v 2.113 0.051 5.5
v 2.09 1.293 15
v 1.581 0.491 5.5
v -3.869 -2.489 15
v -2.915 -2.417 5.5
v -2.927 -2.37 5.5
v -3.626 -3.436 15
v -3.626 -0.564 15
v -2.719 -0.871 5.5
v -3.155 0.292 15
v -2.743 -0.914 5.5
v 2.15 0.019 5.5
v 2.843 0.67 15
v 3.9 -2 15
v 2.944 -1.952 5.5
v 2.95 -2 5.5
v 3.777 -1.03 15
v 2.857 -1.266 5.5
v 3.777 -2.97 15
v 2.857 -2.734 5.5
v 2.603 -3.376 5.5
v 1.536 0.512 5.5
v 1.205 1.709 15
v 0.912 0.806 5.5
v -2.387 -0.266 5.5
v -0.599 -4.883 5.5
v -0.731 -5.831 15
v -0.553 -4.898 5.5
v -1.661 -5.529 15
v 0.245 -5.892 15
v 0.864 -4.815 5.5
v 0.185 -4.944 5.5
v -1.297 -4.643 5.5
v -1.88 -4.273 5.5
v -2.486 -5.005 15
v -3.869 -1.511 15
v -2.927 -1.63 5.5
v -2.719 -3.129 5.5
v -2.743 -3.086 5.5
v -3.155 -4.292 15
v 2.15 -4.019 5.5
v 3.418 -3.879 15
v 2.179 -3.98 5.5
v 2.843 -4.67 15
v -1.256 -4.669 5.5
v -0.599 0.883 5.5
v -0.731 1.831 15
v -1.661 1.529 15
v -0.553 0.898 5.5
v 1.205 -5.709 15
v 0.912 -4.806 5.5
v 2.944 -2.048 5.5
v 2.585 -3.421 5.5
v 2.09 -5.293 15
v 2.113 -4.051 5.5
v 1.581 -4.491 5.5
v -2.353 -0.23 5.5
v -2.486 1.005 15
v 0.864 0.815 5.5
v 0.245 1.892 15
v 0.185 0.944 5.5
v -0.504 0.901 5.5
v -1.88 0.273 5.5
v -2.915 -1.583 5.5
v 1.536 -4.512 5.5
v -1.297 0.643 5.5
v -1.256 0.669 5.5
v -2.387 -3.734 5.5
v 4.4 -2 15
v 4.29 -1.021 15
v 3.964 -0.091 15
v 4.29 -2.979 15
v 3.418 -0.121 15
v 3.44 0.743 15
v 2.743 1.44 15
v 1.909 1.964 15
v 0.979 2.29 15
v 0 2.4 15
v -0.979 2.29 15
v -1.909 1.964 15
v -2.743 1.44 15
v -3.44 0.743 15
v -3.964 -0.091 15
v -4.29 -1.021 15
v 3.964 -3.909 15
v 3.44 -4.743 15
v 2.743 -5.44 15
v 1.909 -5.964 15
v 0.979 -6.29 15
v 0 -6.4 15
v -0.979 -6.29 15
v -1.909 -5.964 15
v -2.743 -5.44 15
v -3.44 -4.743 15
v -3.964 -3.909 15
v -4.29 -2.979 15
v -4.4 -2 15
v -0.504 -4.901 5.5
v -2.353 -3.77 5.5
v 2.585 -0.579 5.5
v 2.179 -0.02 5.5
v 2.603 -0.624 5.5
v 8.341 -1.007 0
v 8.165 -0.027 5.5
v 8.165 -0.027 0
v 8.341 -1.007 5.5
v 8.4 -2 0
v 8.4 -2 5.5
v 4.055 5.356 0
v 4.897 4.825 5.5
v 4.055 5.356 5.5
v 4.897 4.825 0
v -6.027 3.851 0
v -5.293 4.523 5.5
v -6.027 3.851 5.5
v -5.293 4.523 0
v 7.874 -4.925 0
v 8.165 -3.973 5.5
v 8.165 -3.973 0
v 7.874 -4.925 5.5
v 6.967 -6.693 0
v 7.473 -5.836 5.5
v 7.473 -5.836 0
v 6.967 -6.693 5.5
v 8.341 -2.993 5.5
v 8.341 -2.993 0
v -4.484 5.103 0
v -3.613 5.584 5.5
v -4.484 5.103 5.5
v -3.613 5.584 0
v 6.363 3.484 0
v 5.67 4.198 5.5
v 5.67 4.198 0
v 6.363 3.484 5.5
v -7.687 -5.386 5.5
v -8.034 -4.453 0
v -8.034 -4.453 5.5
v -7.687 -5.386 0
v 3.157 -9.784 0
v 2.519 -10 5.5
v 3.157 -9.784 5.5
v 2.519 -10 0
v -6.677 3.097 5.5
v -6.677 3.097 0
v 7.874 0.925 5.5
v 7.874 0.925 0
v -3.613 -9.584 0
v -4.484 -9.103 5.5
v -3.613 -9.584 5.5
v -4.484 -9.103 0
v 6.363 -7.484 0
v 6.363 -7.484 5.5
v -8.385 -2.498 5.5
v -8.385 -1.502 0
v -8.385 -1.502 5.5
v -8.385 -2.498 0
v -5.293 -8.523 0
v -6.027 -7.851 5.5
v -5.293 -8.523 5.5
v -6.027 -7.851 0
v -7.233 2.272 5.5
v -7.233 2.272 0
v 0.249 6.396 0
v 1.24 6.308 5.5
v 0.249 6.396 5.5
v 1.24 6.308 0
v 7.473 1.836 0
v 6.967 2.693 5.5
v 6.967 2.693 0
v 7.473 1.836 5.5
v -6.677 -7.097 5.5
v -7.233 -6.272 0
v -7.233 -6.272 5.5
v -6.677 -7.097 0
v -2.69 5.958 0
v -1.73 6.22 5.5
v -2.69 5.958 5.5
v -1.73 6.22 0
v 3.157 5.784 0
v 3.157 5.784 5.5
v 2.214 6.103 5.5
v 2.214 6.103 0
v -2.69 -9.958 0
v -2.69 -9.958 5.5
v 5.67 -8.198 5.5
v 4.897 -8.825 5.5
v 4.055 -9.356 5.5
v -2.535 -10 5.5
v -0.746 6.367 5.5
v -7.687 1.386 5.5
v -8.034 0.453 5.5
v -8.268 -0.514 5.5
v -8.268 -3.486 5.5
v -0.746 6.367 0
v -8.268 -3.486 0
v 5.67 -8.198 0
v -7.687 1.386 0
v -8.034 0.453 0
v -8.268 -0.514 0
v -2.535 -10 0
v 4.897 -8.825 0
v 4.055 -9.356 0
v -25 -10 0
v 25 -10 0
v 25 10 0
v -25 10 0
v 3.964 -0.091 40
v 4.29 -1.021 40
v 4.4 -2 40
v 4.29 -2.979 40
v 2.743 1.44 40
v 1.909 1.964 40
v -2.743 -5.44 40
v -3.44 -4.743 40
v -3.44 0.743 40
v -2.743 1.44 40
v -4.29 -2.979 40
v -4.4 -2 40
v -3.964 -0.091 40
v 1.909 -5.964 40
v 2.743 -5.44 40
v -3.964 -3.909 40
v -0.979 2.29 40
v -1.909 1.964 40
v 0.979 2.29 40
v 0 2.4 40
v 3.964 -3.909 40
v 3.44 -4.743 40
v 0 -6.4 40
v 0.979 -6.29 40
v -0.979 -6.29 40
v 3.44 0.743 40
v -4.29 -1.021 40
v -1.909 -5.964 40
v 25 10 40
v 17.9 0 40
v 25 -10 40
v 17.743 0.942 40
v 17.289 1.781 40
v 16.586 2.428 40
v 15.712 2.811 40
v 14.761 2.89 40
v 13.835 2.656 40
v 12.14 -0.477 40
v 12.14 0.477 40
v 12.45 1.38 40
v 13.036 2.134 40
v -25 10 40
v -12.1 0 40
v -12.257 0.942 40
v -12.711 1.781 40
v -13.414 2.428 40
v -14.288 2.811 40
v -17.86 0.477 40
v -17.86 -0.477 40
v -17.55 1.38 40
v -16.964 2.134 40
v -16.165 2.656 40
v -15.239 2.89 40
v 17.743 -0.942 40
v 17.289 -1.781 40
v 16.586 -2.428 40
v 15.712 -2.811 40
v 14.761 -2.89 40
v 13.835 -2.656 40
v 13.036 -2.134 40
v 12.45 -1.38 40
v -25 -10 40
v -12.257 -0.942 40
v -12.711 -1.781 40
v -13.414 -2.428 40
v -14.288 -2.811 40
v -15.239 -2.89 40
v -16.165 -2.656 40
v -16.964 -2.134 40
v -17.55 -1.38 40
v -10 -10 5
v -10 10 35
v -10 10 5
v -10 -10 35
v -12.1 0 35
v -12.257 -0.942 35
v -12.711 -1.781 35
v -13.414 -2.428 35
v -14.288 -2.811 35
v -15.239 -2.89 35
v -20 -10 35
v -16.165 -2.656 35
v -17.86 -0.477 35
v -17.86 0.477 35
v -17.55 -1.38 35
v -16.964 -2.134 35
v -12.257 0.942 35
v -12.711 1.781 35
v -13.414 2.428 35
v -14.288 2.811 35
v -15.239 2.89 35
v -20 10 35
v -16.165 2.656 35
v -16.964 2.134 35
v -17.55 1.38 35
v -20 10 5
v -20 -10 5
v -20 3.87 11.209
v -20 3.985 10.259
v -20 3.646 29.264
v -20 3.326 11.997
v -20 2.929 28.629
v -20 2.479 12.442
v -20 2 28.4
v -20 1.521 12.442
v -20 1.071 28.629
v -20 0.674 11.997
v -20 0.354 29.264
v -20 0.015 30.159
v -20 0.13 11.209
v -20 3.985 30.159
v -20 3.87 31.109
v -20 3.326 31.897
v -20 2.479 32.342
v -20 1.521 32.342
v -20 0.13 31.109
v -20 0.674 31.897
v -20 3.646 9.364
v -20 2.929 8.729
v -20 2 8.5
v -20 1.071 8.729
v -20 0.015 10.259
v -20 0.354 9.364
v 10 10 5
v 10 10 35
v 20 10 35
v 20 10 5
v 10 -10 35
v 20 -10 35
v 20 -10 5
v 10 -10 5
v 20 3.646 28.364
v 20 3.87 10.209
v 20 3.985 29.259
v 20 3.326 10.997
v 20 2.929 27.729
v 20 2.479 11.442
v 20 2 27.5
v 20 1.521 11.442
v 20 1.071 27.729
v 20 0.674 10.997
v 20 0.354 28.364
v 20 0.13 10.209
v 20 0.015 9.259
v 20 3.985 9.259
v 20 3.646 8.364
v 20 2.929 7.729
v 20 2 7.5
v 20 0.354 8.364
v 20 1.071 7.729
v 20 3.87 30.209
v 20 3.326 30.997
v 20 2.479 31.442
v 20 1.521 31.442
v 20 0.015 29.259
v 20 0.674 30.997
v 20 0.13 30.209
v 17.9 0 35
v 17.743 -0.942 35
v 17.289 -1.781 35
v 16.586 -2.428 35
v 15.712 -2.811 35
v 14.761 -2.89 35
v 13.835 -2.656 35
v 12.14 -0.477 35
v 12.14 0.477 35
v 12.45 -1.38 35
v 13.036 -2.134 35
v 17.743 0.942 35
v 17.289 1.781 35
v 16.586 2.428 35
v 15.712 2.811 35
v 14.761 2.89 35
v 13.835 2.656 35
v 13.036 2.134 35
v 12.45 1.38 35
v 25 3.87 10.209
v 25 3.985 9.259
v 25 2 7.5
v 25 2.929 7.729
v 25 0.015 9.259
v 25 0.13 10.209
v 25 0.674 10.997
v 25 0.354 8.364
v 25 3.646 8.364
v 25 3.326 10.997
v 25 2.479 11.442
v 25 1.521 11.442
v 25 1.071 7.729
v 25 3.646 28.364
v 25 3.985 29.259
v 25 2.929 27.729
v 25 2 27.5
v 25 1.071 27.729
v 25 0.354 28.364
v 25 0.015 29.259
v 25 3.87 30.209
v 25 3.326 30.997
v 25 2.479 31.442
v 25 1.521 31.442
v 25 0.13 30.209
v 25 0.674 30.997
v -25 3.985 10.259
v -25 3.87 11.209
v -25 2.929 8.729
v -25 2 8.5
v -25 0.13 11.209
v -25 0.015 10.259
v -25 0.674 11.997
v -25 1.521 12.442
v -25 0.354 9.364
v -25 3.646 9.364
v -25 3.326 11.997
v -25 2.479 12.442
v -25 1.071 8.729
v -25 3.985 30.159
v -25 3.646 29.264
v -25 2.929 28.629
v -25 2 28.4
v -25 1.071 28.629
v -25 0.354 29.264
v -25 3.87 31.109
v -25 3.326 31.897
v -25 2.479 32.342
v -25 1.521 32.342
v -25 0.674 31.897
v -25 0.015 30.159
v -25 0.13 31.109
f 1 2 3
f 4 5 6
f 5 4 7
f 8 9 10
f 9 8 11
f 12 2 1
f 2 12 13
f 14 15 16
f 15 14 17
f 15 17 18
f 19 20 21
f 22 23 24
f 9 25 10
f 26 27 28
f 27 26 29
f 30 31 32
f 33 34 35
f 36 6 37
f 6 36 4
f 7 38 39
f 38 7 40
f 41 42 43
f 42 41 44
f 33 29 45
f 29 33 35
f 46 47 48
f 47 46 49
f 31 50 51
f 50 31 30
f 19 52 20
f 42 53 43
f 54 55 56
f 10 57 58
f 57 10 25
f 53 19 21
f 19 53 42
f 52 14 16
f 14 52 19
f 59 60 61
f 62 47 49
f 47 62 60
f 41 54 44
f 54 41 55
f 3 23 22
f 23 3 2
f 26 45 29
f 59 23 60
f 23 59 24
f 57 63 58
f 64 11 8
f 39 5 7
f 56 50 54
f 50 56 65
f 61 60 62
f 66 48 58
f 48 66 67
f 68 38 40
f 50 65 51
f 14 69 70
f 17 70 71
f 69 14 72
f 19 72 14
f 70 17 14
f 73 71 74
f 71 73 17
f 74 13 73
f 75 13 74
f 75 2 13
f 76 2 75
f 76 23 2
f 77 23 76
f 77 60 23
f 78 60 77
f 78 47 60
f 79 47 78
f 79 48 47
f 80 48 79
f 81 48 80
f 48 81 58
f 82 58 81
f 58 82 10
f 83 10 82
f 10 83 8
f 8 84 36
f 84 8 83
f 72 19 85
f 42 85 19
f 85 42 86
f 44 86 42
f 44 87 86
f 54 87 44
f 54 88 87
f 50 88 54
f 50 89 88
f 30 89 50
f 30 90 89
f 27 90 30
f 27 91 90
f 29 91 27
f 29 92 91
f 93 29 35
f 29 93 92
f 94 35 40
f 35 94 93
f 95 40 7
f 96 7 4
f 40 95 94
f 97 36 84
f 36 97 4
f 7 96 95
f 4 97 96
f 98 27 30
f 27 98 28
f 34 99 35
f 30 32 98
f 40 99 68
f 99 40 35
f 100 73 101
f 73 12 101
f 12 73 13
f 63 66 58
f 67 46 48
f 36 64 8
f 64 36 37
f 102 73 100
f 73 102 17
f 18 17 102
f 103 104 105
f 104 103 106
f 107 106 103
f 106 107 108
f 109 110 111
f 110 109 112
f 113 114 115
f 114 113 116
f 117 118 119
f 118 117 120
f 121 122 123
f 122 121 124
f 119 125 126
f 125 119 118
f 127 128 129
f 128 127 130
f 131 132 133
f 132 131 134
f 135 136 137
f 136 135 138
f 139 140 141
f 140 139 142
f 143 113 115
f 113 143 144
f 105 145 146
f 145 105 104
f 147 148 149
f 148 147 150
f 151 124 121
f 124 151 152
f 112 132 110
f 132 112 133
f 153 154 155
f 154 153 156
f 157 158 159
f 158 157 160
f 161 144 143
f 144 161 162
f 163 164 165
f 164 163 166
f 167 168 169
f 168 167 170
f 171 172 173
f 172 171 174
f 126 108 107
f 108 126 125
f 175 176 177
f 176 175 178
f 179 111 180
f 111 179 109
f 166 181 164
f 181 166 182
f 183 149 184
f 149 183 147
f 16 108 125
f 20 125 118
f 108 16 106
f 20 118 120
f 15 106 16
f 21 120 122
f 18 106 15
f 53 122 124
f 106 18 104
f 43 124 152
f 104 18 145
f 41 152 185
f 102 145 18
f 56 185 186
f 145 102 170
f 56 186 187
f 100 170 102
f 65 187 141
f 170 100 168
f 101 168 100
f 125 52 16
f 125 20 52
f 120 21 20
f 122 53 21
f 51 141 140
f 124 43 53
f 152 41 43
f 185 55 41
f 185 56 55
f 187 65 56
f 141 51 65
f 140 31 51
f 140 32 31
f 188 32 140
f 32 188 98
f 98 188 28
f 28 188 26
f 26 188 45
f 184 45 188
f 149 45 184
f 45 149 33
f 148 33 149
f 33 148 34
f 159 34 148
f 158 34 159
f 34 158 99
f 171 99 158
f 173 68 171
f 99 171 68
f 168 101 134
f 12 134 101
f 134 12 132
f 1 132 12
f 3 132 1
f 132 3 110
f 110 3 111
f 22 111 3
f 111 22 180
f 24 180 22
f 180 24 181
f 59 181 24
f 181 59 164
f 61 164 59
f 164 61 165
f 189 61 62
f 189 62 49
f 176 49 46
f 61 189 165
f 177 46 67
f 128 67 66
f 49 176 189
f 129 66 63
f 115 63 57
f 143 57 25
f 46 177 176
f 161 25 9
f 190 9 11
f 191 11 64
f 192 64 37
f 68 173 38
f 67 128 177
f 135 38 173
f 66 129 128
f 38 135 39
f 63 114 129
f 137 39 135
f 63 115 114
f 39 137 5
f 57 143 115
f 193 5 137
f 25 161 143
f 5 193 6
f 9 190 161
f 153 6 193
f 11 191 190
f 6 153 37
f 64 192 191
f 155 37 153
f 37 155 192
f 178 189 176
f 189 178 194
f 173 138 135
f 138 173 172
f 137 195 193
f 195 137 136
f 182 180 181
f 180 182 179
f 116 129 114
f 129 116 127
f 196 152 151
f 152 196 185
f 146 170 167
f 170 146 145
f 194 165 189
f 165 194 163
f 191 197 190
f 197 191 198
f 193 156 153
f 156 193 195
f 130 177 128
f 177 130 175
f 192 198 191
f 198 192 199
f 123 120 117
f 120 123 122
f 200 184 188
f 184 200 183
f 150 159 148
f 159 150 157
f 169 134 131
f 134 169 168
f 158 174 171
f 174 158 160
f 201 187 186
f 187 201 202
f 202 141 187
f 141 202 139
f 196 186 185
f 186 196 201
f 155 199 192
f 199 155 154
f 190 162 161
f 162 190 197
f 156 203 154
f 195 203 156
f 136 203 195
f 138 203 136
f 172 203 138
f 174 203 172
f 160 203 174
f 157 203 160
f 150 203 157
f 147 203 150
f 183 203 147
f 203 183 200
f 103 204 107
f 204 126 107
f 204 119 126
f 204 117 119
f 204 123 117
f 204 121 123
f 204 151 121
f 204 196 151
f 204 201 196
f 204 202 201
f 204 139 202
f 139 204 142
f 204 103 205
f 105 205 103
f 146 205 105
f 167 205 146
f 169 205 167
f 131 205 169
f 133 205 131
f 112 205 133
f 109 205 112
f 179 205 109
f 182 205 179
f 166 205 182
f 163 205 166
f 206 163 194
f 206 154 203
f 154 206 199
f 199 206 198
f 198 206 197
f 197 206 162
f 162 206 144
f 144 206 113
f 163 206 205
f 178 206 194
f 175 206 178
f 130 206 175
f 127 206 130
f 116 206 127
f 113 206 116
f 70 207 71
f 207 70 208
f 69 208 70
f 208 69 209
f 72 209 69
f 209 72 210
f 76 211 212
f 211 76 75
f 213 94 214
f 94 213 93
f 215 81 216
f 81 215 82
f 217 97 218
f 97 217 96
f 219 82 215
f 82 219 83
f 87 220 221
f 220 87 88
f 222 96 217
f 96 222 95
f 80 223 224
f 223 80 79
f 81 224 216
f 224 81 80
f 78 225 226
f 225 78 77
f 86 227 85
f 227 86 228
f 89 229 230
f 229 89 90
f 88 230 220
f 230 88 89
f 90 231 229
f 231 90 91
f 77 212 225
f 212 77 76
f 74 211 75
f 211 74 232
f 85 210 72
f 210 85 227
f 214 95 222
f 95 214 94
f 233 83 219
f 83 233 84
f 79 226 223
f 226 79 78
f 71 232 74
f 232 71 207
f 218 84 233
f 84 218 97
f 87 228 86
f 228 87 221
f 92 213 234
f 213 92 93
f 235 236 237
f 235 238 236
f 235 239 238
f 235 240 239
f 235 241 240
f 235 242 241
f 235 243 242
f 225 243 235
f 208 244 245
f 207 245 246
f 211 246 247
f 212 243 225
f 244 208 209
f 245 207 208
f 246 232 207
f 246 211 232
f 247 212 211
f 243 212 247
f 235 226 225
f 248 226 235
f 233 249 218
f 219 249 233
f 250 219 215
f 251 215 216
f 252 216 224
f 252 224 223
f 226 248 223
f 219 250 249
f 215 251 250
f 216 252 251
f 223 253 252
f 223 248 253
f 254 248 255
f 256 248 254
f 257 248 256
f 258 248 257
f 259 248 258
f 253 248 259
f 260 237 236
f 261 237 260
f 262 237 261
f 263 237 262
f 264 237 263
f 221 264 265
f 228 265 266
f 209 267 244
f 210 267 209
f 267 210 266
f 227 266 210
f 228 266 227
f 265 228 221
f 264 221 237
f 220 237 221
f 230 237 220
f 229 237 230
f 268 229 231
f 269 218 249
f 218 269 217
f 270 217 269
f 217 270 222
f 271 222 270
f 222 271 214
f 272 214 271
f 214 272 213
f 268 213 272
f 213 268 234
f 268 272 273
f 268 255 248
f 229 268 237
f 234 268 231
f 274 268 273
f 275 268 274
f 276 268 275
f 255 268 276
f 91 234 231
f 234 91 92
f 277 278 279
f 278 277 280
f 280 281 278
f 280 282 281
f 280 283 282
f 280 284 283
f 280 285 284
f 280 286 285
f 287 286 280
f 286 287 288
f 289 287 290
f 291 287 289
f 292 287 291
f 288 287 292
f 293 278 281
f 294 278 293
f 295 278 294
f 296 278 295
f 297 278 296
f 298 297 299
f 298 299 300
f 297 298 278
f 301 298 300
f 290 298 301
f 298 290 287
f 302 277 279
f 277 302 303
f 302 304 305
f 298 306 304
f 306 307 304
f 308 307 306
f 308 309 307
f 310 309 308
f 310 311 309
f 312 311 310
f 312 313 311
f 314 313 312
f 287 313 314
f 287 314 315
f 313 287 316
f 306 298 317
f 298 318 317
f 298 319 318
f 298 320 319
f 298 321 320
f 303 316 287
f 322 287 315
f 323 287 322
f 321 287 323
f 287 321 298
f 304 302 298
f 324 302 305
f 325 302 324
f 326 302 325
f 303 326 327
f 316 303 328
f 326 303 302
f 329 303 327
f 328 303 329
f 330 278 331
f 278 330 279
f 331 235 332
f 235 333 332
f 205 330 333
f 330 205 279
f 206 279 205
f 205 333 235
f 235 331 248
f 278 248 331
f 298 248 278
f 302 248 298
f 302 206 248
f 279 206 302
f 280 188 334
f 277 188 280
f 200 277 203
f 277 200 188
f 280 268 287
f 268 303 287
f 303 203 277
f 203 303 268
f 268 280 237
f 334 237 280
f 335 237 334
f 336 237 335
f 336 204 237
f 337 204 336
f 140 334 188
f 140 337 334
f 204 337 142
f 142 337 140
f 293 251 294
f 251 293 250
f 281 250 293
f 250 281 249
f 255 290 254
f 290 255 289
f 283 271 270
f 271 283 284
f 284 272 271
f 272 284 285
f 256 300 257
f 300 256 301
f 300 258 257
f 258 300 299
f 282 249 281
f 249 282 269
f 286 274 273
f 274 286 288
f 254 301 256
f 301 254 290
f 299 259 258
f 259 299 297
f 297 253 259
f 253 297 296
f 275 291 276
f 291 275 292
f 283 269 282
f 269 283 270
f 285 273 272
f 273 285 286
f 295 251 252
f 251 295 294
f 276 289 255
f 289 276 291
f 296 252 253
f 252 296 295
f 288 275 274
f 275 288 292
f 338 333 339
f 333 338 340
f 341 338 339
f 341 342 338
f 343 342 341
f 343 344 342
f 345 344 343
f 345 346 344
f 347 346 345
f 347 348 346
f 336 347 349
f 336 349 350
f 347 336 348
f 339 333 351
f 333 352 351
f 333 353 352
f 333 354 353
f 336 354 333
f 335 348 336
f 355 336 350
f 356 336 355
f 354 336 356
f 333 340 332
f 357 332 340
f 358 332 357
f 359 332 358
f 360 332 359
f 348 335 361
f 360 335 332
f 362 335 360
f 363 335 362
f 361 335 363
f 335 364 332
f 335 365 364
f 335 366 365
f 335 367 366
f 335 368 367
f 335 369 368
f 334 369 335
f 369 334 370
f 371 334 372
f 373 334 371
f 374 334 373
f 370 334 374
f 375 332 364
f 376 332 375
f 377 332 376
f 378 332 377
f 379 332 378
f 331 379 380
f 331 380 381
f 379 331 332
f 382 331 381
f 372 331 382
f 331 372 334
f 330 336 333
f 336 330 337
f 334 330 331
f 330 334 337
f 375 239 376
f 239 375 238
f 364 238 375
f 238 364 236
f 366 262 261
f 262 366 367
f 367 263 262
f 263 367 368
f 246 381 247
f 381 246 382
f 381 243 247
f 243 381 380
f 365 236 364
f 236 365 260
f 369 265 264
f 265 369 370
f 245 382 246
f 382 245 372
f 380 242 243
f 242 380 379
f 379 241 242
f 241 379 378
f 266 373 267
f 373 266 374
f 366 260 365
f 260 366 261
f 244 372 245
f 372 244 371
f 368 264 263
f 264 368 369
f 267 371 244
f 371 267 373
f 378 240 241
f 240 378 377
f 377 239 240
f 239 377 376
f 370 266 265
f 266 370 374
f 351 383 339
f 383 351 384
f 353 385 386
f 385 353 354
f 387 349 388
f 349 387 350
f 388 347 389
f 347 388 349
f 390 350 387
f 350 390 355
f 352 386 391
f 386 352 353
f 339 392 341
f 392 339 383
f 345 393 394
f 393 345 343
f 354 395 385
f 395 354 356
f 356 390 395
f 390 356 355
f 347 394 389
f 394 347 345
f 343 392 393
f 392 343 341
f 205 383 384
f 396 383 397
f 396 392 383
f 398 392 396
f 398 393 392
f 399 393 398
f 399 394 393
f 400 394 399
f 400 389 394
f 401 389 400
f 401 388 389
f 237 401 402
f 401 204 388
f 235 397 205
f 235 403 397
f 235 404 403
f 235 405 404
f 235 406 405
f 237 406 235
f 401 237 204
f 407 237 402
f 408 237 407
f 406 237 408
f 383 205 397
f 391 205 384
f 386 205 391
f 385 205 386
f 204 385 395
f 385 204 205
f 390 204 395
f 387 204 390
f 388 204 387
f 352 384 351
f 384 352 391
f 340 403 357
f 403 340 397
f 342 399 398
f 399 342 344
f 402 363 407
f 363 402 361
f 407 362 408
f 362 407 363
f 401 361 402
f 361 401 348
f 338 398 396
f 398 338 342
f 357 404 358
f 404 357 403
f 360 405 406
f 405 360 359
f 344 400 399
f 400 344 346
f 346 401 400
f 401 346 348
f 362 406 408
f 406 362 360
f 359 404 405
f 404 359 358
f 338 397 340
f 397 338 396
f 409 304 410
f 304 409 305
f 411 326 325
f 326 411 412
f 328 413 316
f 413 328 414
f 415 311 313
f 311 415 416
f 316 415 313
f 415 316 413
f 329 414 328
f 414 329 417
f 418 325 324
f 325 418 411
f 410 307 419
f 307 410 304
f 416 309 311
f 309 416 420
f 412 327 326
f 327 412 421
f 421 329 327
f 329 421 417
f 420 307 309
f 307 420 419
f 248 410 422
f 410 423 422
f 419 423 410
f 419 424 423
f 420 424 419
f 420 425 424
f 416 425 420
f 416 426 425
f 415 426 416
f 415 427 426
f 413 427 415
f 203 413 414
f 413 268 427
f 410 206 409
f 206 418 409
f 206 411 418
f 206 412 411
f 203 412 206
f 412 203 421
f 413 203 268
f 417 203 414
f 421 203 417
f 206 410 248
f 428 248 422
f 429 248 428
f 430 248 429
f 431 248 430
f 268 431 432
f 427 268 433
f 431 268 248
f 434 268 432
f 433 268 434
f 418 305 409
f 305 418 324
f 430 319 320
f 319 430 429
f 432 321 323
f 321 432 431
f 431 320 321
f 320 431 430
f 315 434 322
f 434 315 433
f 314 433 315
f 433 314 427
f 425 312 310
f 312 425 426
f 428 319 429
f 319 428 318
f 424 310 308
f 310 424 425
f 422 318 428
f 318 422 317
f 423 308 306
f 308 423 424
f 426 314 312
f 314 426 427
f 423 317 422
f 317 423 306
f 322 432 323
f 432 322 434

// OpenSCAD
$fa = 1;
$fs = 1;

t = 0.4;

w = 50;
h = 40;
d = 20;

difference() {
	translate([0, 0, h/2]) {
		cube([w, d, h], true);
	}
	translate([0, -2, 0]) {
		translate([0, 0, 5])	cylinder(10, 2.5 + t, 3.5 + t);
		cylinder(5.5, 8 + t, 8 + t);
		translate([-2.5, -8, 0 ]) cube([5, 8 + t, 5]);
		translate([0, 0, h - 25]) cylinder(25, 4 + t, 4 + t);
	}
	translate([0, 0, 5+(h-10)/2]) {
		translate([-15, 0, 0]) {
			cube([10,d,h-10], true);
			cylinder(h, 2.5+t, 2.5+t);
		}
		translate([15, 0, 0]) {
			cube([10,d,h-10], true);
			cylinder(h, 2.5+t, 2.5+t);
		}
	}
	translate([(w-5)/2, 2, 0]) {
		translate([0, 0, 27.5 + (1.6+t) - 18 - 2]) {
			rotate(90, [0, 1, 0]) cylinder(5, 1.6+t, 1.6+t, true);
		}
		translate([0, 0, 47.5 + (1.6+t) - 18 - 2]) {
			rotate(90, [0, 1, 0]) cylinder(5, 1.6+t, 1.6+t, true);
		}
	}

	translate([-(w-5)/2, 2, 0]) {
		translate([0, 0, 28.5 + (1.6+t) - 18 - 2]) {
			rotate(90, [0, 1, 0]) cylinder(5, 1.6+t, 1.6+t, true);
		}
		translate([0, 0, 48.4 + (1.6+t) - 18 - 2]) {
			rotate(90, [0, 1, 0]) cylinder(5, 1.6+t, 1.6+t, true);
		}
	}
}

/*module haut(d) {
	translate([0, 0, d/2]) {
		difference() {
			union() {
				translate([(w-mot)/2,0,0]) cube([w, h, d], true); 
				translate([daxepla, -h/2, 6 - d/2]) cube([12, 24, 12], true); 
			}
			translate([0, 0, -d/2]) {
				cylinder(d, 6.5 + t, 6.5 + t);
				translate([daxe, 0, 0]) {
					cylinder(d, 4 + t, 4 + t);
				}
			}
			vis(-vp, vp);
			vis(-vp, -vp);
			vis(vp, vp);
			vis(vp, -vp);
			translate([daxepla, -h/2 -1, 6 - d/2]) {
				rotate(90, [1, 0, 0]) {
					cylinder(22, 4+t, 4+t, true);
					cylinder(28, 3+t, 3+t, true);
				}
			}
		}
	}
}
*/
